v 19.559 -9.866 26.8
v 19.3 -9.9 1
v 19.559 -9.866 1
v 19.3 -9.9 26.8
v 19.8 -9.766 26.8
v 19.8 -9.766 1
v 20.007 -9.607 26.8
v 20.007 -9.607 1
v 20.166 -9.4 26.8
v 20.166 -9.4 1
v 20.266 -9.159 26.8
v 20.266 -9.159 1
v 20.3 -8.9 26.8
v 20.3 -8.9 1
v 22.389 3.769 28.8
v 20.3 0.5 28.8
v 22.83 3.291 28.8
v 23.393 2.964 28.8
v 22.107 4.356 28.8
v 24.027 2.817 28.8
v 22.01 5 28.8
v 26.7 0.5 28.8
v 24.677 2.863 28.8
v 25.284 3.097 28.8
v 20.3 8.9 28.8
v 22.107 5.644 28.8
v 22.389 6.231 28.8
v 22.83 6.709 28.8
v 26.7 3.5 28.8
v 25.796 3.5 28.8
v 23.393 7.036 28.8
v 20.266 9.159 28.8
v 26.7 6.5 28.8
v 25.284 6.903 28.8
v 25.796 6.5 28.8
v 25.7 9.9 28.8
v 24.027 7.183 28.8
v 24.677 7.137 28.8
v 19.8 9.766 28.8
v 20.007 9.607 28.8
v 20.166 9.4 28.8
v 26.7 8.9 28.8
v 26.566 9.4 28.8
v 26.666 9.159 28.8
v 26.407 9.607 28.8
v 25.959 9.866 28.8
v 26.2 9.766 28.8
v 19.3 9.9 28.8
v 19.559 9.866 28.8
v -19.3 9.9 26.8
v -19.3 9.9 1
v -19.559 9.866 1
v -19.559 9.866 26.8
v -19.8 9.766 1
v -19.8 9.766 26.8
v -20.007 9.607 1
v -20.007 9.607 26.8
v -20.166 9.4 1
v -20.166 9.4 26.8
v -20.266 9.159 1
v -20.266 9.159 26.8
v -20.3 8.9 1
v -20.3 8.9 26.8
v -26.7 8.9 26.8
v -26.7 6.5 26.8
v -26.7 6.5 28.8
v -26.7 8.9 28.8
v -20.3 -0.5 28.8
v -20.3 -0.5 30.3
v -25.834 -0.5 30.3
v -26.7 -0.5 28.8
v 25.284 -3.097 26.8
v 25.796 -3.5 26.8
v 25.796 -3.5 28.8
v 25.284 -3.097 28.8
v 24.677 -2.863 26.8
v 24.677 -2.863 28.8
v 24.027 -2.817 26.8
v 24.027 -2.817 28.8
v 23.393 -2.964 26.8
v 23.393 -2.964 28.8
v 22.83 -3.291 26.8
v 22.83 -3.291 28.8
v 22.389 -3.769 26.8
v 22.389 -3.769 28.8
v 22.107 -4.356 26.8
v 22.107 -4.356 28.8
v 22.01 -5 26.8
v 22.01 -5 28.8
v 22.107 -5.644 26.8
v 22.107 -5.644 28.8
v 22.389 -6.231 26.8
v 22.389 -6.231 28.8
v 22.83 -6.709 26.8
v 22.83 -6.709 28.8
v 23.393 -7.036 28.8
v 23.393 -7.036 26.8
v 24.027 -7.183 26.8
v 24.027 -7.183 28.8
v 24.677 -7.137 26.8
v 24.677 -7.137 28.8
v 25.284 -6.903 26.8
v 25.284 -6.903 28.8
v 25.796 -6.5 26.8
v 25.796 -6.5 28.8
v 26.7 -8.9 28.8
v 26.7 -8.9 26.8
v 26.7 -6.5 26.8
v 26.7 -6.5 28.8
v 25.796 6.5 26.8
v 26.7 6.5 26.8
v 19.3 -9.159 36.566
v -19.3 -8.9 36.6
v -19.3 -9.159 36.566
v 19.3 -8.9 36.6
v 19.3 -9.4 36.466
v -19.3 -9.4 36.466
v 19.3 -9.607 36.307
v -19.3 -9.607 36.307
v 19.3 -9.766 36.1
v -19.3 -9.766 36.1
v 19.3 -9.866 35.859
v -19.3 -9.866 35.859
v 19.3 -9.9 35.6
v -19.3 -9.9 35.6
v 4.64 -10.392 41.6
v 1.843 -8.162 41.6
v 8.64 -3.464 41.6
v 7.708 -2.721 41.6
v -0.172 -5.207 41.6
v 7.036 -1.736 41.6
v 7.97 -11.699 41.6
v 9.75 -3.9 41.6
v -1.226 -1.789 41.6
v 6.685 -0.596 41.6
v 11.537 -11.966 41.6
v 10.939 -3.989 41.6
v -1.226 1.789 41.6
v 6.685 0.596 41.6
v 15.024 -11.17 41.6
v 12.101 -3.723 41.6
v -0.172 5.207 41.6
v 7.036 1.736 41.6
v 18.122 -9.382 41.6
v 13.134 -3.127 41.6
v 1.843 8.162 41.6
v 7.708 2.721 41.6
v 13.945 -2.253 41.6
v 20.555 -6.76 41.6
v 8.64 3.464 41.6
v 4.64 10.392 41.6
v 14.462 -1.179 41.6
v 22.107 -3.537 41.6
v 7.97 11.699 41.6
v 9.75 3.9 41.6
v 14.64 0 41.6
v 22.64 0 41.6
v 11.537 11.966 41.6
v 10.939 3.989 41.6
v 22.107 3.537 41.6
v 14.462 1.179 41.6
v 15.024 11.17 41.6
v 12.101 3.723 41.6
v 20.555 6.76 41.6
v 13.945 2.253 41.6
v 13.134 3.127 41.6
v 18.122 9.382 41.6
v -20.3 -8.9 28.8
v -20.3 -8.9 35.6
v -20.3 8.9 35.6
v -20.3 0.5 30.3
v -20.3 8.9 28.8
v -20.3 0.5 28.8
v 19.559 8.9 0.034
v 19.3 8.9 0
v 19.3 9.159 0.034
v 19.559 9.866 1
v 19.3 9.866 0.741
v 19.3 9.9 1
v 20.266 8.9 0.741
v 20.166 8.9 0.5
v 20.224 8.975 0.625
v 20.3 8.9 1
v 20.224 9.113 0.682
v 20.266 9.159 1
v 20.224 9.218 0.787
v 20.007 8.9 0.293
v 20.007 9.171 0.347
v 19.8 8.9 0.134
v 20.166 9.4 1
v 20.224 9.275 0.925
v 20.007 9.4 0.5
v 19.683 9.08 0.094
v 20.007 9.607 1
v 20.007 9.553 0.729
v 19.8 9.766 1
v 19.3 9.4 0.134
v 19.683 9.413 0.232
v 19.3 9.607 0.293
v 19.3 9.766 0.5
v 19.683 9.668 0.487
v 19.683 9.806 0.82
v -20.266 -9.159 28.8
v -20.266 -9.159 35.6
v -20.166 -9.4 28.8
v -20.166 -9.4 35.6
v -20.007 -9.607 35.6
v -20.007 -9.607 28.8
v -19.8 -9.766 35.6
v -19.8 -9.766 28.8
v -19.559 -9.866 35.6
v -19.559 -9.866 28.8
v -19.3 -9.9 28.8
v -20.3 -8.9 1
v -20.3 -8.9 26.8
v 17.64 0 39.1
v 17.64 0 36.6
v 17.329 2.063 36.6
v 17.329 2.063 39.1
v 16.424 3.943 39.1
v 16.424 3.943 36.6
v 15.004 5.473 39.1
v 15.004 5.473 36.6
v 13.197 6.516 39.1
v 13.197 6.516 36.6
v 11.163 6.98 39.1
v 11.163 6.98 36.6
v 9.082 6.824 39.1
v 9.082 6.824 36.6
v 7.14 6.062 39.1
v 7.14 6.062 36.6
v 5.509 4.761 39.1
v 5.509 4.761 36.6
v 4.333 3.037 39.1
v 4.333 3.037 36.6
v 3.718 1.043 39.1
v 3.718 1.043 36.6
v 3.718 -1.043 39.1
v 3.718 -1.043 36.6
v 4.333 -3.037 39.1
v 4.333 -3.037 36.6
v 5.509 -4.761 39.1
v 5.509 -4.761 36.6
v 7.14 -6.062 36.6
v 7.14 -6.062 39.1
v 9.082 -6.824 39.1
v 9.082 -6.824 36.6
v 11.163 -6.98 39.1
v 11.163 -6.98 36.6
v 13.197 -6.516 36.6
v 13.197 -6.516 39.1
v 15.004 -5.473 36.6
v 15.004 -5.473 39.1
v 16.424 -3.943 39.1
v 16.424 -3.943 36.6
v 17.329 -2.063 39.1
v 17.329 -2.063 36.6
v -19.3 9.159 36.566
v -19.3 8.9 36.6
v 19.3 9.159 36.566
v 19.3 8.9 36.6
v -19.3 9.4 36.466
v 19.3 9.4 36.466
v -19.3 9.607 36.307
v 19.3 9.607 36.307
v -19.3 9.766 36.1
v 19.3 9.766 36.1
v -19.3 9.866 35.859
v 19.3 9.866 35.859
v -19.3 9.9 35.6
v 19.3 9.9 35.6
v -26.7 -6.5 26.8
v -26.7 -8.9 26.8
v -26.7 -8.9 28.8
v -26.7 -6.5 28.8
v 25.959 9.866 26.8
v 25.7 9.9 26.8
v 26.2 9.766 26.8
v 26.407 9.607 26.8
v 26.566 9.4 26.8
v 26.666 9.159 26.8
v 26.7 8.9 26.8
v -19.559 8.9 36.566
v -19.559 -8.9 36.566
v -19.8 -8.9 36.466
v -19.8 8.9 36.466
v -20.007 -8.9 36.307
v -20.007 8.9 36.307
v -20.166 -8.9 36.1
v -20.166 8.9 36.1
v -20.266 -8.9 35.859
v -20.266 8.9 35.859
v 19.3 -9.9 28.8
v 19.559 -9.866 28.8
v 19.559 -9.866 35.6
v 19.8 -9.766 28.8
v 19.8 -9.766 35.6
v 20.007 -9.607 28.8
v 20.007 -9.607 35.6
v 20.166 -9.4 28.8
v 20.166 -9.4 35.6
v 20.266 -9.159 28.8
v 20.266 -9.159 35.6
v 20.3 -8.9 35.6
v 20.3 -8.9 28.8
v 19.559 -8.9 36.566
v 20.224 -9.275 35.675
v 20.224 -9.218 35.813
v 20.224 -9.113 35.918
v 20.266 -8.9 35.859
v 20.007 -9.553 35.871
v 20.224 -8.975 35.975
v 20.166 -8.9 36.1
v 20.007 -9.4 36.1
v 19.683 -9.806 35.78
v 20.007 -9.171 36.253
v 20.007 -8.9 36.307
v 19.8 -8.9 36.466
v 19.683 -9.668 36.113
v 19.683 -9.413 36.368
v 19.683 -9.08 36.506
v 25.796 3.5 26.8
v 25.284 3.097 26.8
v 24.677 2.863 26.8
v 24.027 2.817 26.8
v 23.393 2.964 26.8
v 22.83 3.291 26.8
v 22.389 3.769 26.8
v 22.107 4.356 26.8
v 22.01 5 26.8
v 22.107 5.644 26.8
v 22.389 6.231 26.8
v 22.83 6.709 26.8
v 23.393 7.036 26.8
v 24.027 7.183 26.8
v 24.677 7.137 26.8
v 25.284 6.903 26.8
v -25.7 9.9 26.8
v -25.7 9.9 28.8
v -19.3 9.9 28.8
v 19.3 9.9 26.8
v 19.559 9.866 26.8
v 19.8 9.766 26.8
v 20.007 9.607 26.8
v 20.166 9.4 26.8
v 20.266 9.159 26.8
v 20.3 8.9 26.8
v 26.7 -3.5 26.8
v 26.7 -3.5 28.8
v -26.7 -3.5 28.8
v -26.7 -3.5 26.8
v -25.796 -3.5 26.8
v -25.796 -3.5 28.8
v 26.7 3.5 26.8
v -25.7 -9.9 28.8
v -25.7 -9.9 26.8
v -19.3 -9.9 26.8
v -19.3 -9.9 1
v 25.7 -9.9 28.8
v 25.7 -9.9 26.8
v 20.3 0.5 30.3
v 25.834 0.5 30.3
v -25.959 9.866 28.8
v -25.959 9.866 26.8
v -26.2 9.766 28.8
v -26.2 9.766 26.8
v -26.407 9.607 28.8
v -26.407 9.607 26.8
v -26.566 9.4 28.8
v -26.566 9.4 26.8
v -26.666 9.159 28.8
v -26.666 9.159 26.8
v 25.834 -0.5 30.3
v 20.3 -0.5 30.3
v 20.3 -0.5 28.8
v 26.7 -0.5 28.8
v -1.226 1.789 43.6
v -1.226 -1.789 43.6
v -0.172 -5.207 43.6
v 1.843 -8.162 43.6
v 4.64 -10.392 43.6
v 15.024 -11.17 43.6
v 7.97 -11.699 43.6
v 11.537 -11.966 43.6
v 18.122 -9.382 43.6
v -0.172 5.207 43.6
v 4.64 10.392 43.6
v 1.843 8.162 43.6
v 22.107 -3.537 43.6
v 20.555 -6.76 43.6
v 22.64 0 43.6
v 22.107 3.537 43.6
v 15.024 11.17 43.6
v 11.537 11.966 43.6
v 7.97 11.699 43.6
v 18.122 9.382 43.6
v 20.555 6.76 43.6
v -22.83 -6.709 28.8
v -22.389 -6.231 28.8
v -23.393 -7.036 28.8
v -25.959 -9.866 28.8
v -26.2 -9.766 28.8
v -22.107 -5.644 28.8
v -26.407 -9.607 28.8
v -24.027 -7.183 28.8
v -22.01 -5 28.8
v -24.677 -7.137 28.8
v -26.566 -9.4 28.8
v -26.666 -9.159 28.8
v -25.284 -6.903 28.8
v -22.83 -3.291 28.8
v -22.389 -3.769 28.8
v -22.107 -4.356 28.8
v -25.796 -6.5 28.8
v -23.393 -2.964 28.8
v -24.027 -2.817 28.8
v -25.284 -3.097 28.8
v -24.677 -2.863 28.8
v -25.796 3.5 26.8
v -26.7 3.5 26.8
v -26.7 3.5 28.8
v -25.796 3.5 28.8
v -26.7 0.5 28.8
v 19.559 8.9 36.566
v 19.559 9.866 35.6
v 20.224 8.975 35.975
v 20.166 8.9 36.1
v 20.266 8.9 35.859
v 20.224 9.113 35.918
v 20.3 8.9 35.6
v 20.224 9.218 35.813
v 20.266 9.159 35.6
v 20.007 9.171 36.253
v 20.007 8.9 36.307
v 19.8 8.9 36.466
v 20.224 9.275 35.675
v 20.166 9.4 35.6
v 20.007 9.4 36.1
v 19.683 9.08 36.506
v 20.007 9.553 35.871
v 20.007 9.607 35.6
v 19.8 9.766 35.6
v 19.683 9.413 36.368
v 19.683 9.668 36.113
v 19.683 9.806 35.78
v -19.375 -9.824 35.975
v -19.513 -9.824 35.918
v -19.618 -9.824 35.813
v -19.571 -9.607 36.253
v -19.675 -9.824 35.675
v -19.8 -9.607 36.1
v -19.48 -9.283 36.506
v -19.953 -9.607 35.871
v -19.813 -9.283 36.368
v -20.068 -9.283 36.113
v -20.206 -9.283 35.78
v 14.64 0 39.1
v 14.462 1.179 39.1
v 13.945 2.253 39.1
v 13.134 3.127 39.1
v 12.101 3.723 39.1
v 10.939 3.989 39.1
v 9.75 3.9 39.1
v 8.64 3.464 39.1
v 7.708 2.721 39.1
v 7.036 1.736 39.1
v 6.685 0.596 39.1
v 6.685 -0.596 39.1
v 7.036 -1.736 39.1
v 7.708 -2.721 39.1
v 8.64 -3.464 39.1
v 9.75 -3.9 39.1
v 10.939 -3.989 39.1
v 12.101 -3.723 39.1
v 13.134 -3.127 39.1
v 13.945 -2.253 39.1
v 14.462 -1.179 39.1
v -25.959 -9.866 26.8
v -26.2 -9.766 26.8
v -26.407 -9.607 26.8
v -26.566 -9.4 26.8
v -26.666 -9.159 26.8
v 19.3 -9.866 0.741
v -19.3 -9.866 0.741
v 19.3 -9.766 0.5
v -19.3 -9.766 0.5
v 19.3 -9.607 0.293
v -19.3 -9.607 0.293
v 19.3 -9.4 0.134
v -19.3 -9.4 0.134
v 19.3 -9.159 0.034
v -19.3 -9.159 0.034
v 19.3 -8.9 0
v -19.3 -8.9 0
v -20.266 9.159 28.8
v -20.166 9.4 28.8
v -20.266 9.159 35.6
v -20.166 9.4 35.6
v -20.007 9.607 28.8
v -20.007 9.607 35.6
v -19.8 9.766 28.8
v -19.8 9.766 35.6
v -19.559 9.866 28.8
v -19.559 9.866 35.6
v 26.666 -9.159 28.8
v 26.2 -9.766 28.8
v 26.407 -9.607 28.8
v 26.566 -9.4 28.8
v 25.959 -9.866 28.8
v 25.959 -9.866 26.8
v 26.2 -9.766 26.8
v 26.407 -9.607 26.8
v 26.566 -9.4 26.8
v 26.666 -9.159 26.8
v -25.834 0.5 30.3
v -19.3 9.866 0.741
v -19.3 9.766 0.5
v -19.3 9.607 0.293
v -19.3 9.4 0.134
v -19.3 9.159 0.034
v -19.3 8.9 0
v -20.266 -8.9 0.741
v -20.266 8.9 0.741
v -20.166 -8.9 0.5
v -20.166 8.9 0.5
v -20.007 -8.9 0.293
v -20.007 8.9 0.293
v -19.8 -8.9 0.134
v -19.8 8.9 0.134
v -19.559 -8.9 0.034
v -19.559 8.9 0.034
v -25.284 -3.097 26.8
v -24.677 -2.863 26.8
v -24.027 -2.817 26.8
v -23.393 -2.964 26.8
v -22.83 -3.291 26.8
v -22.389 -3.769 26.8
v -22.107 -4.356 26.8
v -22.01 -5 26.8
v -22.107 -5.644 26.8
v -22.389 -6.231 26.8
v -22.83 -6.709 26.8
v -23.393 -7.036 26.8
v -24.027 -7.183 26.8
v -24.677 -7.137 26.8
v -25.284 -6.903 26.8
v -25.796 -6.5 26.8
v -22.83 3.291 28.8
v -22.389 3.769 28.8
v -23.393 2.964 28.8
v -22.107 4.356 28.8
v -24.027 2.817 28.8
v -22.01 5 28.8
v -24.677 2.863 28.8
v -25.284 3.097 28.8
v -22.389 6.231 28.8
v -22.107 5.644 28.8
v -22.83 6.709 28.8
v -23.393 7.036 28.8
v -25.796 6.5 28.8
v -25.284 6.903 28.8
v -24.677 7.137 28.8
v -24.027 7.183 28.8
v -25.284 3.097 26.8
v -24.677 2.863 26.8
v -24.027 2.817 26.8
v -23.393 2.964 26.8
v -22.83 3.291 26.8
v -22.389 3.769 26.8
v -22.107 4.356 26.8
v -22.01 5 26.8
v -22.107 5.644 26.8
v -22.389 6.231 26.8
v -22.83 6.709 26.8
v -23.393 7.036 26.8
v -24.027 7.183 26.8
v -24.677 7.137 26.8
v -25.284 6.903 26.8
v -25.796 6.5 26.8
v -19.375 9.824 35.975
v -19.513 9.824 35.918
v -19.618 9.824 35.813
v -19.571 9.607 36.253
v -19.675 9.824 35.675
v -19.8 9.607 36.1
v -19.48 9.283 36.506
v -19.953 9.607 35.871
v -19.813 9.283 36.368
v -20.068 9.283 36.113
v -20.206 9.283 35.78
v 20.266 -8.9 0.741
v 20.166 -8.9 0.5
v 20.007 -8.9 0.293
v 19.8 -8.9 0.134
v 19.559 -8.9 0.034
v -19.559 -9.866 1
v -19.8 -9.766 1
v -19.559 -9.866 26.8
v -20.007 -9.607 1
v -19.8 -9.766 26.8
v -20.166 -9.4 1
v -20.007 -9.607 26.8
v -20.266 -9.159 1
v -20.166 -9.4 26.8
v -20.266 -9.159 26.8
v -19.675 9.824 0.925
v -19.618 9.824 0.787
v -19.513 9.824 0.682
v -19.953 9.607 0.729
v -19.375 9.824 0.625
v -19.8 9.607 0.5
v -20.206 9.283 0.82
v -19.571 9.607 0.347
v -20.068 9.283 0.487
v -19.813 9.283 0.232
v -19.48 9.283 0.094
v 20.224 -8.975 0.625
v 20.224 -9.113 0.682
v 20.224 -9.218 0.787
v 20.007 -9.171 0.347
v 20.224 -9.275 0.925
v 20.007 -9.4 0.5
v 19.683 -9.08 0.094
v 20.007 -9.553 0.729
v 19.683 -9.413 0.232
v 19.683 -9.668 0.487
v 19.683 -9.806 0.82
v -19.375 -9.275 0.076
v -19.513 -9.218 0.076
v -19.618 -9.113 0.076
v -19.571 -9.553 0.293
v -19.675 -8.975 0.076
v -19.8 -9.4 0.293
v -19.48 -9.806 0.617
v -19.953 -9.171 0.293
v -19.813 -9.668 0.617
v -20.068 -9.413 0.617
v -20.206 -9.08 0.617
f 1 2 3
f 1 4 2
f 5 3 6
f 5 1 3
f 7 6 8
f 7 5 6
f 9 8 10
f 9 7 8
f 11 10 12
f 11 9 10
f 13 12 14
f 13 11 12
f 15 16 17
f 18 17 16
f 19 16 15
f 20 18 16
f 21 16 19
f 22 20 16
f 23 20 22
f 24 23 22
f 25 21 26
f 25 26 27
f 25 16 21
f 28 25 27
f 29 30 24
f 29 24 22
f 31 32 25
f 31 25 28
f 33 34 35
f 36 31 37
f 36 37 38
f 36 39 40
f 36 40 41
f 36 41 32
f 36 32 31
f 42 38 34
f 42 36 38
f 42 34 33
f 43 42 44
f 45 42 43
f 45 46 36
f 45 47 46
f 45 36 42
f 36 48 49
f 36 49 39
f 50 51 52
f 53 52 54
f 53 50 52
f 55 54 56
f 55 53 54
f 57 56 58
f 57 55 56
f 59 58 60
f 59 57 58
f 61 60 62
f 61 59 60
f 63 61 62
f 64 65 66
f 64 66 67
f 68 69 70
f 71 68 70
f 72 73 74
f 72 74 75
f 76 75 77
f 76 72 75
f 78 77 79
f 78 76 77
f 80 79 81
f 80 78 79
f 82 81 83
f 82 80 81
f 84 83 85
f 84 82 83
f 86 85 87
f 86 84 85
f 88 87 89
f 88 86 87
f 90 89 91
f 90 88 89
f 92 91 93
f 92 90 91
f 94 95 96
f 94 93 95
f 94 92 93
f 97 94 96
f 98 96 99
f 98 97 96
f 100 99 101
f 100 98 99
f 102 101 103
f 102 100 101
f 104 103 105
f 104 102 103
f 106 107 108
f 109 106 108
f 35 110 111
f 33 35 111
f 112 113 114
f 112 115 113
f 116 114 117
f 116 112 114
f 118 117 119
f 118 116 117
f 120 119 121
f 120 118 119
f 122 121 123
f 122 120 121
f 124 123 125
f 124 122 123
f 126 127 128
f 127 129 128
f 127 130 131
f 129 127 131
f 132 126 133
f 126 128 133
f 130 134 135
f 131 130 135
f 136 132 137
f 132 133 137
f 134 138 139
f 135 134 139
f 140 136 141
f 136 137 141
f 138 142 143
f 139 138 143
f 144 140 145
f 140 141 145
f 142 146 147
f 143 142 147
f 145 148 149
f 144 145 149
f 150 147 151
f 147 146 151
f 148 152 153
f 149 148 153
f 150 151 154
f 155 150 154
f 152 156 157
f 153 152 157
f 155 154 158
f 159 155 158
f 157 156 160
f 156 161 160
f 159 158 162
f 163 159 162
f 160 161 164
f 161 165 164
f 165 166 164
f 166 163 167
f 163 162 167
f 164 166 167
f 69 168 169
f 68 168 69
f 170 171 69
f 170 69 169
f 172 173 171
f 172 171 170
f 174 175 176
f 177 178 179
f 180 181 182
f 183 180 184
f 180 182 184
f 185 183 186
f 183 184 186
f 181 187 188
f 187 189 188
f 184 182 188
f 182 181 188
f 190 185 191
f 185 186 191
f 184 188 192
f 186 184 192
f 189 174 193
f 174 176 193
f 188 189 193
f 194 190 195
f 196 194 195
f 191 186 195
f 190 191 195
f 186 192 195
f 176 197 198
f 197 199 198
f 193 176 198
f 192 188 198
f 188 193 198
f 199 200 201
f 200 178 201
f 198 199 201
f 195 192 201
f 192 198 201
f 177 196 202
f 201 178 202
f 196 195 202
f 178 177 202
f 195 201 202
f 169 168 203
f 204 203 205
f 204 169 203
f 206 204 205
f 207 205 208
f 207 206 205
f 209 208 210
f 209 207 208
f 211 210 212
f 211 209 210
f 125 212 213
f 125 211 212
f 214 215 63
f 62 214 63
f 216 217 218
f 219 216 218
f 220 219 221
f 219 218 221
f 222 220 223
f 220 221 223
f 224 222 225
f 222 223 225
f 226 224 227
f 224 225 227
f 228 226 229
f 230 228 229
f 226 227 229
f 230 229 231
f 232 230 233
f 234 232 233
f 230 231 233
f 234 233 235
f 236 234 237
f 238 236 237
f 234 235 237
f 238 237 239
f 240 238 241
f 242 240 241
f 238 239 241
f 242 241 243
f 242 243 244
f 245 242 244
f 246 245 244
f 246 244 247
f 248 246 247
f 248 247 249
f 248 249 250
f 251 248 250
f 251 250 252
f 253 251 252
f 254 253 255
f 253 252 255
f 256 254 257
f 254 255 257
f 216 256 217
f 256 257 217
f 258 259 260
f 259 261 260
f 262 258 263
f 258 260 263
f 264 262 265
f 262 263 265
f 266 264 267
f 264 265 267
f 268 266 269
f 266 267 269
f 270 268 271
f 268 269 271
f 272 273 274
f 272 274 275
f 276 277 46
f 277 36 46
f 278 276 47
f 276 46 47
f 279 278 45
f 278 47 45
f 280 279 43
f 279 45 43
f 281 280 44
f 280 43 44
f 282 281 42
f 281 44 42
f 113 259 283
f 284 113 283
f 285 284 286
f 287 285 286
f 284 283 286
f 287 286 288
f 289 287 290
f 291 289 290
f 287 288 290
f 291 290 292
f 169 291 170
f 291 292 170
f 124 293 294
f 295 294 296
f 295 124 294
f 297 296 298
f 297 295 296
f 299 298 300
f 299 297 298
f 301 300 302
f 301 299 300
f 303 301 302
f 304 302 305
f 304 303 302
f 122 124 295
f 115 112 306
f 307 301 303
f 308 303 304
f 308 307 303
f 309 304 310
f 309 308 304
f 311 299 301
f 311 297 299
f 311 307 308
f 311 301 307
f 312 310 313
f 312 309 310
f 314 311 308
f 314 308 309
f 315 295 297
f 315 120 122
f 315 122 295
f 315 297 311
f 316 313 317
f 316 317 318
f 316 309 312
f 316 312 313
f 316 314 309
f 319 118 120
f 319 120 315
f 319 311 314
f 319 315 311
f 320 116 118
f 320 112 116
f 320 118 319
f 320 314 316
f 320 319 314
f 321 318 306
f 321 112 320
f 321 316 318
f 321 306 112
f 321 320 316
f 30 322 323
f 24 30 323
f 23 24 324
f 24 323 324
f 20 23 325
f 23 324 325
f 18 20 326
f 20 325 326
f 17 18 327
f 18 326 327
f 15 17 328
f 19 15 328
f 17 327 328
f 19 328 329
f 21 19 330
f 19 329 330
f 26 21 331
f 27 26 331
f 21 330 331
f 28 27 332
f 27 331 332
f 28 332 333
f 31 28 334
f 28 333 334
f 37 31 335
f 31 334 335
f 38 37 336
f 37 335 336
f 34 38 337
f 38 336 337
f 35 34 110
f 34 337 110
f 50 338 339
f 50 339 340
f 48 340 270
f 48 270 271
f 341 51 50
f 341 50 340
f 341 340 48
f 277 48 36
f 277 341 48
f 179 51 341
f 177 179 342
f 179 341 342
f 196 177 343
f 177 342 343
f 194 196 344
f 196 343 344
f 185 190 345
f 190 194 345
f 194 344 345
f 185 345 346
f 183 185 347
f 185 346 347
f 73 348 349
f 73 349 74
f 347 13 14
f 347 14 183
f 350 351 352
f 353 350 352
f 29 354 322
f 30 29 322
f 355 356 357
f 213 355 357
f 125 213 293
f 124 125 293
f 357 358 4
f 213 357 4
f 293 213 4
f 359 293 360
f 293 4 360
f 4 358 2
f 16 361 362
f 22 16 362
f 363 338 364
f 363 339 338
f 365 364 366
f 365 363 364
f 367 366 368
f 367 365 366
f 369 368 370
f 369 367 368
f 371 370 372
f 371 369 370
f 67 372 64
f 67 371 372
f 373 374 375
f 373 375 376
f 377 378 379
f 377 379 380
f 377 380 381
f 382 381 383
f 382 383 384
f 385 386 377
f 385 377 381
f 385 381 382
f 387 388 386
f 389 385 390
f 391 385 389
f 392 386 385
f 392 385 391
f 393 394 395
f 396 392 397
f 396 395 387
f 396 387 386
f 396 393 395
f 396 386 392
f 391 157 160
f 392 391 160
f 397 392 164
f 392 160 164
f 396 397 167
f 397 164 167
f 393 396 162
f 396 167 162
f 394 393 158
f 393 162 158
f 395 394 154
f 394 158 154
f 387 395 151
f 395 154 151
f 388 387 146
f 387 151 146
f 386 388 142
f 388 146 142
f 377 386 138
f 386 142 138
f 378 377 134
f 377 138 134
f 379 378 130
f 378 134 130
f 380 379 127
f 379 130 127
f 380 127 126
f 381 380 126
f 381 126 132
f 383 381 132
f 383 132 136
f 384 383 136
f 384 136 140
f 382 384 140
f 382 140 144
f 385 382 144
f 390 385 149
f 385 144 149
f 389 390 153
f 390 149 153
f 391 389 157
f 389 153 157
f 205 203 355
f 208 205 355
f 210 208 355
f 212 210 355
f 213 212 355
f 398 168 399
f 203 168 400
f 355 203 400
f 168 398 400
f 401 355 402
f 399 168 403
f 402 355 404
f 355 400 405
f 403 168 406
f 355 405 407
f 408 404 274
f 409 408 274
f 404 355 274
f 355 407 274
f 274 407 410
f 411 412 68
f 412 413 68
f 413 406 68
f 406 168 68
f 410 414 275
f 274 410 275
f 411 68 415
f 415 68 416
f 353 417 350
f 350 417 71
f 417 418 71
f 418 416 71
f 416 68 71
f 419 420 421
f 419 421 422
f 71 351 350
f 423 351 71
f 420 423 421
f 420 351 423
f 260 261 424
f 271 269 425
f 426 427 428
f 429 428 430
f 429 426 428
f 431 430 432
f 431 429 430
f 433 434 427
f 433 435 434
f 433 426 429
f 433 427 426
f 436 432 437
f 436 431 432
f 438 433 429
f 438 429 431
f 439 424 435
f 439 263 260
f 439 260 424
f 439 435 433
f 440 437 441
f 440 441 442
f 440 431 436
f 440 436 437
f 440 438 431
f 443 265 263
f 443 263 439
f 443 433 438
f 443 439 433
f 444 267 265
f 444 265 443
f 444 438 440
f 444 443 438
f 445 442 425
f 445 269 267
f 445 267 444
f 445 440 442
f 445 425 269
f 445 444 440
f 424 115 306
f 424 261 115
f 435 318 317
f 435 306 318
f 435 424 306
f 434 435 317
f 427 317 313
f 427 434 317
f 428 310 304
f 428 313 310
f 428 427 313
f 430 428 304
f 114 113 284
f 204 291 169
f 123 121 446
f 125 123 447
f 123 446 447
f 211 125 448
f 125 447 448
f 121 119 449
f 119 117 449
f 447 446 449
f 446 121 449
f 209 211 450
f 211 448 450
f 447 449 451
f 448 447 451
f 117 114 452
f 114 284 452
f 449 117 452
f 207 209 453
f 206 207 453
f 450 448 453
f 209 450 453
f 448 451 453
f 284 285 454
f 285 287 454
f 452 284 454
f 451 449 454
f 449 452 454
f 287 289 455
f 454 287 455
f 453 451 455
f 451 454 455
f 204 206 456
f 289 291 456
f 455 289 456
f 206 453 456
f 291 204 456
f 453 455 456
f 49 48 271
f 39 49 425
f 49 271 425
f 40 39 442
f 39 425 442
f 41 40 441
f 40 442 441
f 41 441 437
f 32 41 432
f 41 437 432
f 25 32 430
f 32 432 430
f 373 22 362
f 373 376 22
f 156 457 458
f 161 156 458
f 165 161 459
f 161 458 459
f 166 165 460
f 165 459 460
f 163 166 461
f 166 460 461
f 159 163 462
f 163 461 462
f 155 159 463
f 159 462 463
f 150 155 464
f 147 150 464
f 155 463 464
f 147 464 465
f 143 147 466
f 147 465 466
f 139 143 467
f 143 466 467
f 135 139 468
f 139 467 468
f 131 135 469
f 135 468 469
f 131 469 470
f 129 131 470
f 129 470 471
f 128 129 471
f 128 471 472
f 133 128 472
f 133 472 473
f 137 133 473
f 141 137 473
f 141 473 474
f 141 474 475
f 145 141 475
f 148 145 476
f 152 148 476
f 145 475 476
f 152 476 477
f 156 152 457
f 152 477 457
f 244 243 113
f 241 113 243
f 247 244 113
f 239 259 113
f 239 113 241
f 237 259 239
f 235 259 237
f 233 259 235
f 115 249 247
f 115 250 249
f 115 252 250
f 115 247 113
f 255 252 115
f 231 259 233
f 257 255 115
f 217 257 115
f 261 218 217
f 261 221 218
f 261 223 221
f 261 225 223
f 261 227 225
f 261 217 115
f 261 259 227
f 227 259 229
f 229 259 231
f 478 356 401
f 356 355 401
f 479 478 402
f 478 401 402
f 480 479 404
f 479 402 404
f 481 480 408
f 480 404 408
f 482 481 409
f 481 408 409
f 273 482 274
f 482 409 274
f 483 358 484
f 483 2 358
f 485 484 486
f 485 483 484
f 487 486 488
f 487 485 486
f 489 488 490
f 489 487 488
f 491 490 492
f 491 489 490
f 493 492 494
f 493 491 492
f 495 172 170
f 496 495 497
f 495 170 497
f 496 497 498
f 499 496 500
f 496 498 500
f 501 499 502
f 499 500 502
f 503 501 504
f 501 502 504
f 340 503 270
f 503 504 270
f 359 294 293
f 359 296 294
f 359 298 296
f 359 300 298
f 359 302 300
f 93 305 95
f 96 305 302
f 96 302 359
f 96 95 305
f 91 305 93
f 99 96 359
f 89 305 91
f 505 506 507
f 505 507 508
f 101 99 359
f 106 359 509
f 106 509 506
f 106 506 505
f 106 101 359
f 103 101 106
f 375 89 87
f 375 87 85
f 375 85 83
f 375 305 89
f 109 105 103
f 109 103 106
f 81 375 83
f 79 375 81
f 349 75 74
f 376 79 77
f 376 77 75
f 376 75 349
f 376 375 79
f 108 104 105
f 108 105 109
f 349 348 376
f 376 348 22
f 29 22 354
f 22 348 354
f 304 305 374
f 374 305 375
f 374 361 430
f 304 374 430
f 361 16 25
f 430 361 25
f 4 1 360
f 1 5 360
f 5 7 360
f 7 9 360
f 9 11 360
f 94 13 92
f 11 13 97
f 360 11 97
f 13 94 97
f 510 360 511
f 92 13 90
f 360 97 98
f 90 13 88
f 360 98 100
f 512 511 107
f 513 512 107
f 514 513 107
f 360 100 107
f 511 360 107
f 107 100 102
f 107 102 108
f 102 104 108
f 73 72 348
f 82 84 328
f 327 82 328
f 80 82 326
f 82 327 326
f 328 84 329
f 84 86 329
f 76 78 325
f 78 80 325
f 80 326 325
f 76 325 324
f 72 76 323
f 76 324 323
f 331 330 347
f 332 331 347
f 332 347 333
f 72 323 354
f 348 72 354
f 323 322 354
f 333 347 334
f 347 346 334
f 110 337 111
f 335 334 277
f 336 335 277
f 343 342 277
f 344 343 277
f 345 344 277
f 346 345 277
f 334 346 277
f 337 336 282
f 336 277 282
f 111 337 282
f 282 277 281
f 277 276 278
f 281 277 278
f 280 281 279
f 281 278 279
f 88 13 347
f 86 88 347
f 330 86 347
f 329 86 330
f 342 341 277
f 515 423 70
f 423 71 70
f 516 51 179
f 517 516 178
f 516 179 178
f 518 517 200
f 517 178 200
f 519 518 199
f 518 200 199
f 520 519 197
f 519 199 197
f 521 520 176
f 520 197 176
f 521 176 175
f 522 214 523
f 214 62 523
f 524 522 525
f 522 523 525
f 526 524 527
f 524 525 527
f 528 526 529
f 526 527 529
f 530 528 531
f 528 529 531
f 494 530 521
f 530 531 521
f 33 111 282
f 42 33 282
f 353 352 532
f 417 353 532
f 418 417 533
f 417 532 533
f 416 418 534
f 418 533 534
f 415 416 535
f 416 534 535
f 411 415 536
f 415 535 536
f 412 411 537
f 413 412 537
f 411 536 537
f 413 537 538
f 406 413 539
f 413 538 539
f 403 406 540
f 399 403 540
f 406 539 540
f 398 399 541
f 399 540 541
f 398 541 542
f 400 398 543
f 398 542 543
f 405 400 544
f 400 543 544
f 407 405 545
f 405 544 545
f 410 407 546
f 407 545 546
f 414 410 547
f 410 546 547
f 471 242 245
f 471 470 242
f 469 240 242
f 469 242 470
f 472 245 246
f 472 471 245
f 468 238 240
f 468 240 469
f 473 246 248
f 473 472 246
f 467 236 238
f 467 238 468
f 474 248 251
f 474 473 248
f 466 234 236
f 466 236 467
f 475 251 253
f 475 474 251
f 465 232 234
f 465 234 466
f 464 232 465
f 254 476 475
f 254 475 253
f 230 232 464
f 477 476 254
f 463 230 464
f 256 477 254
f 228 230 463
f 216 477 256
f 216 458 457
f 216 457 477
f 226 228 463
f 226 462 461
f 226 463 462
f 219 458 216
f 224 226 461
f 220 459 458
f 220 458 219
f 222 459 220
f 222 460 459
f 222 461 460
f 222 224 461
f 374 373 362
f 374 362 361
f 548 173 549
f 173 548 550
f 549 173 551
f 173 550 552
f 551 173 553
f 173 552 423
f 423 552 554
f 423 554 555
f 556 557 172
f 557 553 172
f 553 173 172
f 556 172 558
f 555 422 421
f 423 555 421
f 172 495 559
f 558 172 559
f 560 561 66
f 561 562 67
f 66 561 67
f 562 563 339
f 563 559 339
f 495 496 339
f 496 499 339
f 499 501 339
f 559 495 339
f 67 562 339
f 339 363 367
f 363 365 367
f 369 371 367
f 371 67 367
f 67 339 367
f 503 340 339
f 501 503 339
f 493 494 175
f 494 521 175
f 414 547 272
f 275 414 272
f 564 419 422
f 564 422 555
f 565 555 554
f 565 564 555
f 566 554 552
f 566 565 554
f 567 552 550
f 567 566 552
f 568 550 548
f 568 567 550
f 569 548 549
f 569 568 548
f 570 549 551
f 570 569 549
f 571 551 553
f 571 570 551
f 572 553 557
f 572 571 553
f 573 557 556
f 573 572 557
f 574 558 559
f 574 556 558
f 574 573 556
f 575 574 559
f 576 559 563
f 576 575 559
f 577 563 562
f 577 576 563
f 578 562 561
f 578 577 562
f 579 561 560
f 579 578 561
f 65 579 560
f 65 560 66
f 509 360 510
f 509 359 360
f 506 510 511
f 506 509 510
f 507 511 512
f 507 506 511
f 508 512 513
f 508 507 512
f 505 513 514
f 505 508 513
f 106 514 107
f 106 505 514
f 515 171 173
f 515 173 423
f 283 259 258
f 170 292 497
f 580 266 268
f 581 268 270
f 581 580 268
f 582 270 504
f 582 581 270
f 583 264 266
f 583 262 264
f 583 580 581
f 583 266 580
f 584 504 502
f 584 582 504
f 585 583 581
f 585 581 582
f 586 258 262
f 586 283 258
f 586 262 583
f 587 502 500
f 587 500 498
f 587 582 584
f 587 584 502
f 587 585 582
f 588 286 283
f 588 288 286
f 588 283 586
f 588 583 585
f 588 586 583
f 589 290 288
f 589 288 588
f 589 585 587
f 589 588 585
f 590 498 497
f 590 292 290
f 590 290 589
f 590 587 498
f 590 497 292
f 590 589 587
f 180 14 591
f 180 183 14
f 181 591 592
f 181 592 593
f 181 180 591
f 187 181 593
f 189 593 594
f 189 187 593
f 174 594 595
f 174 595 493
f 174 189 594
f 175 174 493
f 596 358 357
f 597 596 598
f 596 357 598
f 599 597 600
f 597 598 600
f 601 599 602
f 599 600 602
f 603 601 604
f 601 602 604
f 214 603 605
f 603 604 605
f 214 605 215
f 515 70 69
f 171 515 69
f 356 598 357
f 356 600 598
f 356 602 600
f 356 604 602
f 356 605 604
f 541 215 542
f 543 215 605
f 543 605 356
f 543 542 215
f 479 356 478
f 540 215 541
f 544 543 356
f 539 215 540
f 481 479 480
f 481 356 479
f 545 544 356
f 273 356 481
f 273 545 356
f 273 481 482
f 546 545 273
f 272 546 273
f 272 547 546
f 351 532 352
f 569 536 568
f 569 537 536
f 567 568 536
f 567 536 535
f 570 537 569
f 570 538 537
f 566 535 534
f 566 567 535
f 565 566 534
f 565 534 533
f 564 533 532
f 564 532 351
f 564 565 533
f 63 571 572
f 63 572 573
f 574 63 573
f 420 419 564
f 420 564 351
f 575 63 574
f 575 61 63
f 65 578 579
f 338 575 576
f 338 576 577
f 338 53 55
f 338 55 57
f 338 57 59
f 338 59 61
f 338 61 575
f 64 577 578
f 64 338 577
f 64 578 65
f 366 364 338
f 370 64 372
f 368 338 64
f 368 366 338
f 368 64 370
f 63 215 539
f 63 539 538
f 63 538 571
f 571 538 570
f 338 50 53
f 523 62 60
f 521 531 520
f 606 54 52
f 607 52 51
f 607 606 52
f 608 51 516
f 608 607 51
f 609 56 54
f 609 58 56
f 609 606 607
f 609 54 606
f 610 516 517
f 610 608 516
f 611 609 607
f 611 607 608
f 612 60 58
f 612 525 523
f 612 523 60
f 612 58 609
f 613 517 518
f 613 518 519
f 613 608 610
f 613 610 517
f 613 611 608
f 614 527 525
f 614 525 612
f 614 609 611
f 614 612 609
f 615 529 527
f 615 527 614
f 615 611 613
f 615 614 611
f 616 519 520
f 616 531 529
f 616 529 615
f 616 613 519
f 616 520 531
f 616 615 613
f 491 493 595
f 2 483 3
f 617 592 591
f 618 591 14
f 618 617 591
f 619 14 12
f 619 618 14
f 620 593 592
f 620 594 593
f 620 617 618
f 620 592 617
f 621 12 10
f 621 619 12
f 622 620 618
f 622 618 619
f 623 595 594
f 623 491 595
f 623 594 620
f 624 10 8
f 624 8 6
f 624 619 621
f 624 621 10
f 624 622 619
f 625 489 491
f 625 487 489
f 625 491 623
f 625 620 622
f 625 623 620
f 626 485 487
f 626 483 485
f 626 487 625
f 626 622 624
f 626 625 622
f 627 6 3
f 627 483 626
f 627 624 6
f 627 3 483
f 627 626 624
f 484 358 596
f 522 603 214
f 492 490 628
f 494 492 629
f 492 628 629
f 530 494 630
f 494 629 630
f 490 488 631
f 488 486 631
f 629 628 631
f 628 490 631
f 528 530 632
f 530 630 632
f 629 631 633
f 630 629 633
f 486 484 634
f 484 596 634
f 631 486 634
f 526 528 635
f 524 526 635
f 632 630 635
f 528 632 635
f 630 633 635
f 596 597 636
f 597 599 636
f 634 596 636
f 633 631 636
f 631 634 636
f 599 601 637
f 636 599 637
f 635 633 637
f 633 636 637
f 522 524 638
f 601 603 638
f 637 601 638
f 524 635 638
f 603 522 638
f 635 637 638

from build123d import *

# Parameters (mm, degrees)
F1_W              = 40.6
F1_H              = 19.8
F2_DEPTH          = 36.6
F3_R              = 7
F4_DEPTH          = 2.5
F5_R              = 4
F6_DEPTH          = 2.5
F7_R              = 12
F8_DEPTH          = 2
F10_W             = 6.4
F10_H             = 19.8
F11_DEPTH         = 2
F13_DEPTH         = 4
F13_COPIES2_COUNT = 2
F14_R             = 1
F16_DEPTH         = 0.5


# Not quite as in the source:
# - a pattern or mirror of a feature is missing from the dataset's text; its kind, count and spacing are read off the source's solid


with BuildPart() as f2:
    # F1 (on Top) → F2 (new body)
    with BuildSketch(Plane.XY):
        Rectangle(F1_W, F1_H)
    extrude(amount=F2_DEPTH)

    # F3 (on face) → F4 (join)
    with BuildSketch(Plane.XY.offset(36.6)):
        with Locations((10.64, 0)):
            Circle(F3_R)
    extrude(amount=F4_DEPTH)

    # F5 (on face) → F6 (join)
    with BuildSketch(Plane.XY.offset(39.1)):
        with Locations((10.64, 0)):
            Circle(F5_R)
    extrude(amount=F6_DEPTH)

    # F7 (on face) → F8 (join)
    with BuildSketch(Plane.XY.offset(41.6)):
        with Locations((10.64, 0)):
            Circle(F7_R)
    extrude(amount=F8_DEPTH)

    # F10 (on offset) → F11 (join)
    with BuildSketch(Plane.XY.offset(26.8)):
        with Locations((23.5, 0)):
            Rectangle(F10_W, F10_H)
    f11 = extrude(amount=F11_DEPTH)

    # F11_copies: F11 across plane
    add(f11.mirror(Plane(origin=(0, 0, 0), x_dir=(0, 0, -1), z_dir=(-1, 0, 0))))

    # F12 (on offset) → F13 (cut)
    with BuildSketch(Plane.XY.offset(26.8)):
        with BuildLine():
            Line((26.7, -3.5), (25.7956503376, -3.5))
            ThreePointArc((25.7956503376, -3.5), (22.01, -5), (25.7956503376, -6.5))
            Line((25.7956503376, -6.5), (26.7, -6.5))
            Line((26.7, -6.5), (26.7, -3.5))
        make_face()
    f13 = extrude(amount=F13_DEPTH, mode=Mode.SUBTRACT)

    # F13_copies: F13 across plane
    add(f13.mirror(Plane(origin=(0, 0, 0), x_dir=(0, 0, -1), z_dir=(-1, 0, 0))), mode=Mode.SUBTRACT)

    # F13_copies1: F13 across plane
    add(f13.mirror(Plane.ZX), mode=Mode.SUBTRACT)

    # F13_copies2: F13 ×2 about axis
    f13_copies2_axis = Axis((0, 0, 0), (0, 0, 1))
    for i in range(1, F13_COPIES2_COUNT):
        add(f13.rotate(f13_copies2_axis, i * 360 / F13_COPIES2_COUNT), mode=Mode.SUBTRACT)

    # F14
    f14_edges = [f2.edges().sort_by_distance(p)[0] for p in [
        (-20.3, -9.9, 13.4),
        (0, -9.9, 0),
        (-20.3, 0, 0),
        (-20.3, 9.9, 13.4),
        (0, 9.9, 0),
        (20.3, 0, 0),
        (20.3, 9.9, 13.4),
        (20.3, -9.9, 13.4),
        (-20.3, 0, 36.6),
        (0, 9.9, 36.6),
        (0, -9.9, 36.6),
        (20.3, -9.9, 32.7),
        (20.3, 0, 36.6),
        (20.3, 9.9, 32.7),
        (26.7, -9.9, 27.8),
        (26.7, 9.9, 27.8),
        (-20.3, 9.9, 32.7),
        (-26.7, 9.9, 27.8),
        (-20.3, -9.9, 32.7),
        (-26.7, -9.9, 27.8),
    ]]
    fillet(f14_edges, radius=F14_R)

    # F15 (on Front) → F16 (join, symmetric)
    with BuildSketch(Plane.XZ):
        Polygon((26.7, 28.8), (25.8339745962, 30.3), (20.3, 30.3), (20.3, 28.8), align=None)
    f16 = extrude(amount=F16_DEPTH, both=True)

    # F16_copies: F16 across plane
    add(f16.mirror(Plane(origin=(0, 0, 0), x_dir=(0, 0, -1), z_dir=(-1, 0, 0))))


solid = f2.part
